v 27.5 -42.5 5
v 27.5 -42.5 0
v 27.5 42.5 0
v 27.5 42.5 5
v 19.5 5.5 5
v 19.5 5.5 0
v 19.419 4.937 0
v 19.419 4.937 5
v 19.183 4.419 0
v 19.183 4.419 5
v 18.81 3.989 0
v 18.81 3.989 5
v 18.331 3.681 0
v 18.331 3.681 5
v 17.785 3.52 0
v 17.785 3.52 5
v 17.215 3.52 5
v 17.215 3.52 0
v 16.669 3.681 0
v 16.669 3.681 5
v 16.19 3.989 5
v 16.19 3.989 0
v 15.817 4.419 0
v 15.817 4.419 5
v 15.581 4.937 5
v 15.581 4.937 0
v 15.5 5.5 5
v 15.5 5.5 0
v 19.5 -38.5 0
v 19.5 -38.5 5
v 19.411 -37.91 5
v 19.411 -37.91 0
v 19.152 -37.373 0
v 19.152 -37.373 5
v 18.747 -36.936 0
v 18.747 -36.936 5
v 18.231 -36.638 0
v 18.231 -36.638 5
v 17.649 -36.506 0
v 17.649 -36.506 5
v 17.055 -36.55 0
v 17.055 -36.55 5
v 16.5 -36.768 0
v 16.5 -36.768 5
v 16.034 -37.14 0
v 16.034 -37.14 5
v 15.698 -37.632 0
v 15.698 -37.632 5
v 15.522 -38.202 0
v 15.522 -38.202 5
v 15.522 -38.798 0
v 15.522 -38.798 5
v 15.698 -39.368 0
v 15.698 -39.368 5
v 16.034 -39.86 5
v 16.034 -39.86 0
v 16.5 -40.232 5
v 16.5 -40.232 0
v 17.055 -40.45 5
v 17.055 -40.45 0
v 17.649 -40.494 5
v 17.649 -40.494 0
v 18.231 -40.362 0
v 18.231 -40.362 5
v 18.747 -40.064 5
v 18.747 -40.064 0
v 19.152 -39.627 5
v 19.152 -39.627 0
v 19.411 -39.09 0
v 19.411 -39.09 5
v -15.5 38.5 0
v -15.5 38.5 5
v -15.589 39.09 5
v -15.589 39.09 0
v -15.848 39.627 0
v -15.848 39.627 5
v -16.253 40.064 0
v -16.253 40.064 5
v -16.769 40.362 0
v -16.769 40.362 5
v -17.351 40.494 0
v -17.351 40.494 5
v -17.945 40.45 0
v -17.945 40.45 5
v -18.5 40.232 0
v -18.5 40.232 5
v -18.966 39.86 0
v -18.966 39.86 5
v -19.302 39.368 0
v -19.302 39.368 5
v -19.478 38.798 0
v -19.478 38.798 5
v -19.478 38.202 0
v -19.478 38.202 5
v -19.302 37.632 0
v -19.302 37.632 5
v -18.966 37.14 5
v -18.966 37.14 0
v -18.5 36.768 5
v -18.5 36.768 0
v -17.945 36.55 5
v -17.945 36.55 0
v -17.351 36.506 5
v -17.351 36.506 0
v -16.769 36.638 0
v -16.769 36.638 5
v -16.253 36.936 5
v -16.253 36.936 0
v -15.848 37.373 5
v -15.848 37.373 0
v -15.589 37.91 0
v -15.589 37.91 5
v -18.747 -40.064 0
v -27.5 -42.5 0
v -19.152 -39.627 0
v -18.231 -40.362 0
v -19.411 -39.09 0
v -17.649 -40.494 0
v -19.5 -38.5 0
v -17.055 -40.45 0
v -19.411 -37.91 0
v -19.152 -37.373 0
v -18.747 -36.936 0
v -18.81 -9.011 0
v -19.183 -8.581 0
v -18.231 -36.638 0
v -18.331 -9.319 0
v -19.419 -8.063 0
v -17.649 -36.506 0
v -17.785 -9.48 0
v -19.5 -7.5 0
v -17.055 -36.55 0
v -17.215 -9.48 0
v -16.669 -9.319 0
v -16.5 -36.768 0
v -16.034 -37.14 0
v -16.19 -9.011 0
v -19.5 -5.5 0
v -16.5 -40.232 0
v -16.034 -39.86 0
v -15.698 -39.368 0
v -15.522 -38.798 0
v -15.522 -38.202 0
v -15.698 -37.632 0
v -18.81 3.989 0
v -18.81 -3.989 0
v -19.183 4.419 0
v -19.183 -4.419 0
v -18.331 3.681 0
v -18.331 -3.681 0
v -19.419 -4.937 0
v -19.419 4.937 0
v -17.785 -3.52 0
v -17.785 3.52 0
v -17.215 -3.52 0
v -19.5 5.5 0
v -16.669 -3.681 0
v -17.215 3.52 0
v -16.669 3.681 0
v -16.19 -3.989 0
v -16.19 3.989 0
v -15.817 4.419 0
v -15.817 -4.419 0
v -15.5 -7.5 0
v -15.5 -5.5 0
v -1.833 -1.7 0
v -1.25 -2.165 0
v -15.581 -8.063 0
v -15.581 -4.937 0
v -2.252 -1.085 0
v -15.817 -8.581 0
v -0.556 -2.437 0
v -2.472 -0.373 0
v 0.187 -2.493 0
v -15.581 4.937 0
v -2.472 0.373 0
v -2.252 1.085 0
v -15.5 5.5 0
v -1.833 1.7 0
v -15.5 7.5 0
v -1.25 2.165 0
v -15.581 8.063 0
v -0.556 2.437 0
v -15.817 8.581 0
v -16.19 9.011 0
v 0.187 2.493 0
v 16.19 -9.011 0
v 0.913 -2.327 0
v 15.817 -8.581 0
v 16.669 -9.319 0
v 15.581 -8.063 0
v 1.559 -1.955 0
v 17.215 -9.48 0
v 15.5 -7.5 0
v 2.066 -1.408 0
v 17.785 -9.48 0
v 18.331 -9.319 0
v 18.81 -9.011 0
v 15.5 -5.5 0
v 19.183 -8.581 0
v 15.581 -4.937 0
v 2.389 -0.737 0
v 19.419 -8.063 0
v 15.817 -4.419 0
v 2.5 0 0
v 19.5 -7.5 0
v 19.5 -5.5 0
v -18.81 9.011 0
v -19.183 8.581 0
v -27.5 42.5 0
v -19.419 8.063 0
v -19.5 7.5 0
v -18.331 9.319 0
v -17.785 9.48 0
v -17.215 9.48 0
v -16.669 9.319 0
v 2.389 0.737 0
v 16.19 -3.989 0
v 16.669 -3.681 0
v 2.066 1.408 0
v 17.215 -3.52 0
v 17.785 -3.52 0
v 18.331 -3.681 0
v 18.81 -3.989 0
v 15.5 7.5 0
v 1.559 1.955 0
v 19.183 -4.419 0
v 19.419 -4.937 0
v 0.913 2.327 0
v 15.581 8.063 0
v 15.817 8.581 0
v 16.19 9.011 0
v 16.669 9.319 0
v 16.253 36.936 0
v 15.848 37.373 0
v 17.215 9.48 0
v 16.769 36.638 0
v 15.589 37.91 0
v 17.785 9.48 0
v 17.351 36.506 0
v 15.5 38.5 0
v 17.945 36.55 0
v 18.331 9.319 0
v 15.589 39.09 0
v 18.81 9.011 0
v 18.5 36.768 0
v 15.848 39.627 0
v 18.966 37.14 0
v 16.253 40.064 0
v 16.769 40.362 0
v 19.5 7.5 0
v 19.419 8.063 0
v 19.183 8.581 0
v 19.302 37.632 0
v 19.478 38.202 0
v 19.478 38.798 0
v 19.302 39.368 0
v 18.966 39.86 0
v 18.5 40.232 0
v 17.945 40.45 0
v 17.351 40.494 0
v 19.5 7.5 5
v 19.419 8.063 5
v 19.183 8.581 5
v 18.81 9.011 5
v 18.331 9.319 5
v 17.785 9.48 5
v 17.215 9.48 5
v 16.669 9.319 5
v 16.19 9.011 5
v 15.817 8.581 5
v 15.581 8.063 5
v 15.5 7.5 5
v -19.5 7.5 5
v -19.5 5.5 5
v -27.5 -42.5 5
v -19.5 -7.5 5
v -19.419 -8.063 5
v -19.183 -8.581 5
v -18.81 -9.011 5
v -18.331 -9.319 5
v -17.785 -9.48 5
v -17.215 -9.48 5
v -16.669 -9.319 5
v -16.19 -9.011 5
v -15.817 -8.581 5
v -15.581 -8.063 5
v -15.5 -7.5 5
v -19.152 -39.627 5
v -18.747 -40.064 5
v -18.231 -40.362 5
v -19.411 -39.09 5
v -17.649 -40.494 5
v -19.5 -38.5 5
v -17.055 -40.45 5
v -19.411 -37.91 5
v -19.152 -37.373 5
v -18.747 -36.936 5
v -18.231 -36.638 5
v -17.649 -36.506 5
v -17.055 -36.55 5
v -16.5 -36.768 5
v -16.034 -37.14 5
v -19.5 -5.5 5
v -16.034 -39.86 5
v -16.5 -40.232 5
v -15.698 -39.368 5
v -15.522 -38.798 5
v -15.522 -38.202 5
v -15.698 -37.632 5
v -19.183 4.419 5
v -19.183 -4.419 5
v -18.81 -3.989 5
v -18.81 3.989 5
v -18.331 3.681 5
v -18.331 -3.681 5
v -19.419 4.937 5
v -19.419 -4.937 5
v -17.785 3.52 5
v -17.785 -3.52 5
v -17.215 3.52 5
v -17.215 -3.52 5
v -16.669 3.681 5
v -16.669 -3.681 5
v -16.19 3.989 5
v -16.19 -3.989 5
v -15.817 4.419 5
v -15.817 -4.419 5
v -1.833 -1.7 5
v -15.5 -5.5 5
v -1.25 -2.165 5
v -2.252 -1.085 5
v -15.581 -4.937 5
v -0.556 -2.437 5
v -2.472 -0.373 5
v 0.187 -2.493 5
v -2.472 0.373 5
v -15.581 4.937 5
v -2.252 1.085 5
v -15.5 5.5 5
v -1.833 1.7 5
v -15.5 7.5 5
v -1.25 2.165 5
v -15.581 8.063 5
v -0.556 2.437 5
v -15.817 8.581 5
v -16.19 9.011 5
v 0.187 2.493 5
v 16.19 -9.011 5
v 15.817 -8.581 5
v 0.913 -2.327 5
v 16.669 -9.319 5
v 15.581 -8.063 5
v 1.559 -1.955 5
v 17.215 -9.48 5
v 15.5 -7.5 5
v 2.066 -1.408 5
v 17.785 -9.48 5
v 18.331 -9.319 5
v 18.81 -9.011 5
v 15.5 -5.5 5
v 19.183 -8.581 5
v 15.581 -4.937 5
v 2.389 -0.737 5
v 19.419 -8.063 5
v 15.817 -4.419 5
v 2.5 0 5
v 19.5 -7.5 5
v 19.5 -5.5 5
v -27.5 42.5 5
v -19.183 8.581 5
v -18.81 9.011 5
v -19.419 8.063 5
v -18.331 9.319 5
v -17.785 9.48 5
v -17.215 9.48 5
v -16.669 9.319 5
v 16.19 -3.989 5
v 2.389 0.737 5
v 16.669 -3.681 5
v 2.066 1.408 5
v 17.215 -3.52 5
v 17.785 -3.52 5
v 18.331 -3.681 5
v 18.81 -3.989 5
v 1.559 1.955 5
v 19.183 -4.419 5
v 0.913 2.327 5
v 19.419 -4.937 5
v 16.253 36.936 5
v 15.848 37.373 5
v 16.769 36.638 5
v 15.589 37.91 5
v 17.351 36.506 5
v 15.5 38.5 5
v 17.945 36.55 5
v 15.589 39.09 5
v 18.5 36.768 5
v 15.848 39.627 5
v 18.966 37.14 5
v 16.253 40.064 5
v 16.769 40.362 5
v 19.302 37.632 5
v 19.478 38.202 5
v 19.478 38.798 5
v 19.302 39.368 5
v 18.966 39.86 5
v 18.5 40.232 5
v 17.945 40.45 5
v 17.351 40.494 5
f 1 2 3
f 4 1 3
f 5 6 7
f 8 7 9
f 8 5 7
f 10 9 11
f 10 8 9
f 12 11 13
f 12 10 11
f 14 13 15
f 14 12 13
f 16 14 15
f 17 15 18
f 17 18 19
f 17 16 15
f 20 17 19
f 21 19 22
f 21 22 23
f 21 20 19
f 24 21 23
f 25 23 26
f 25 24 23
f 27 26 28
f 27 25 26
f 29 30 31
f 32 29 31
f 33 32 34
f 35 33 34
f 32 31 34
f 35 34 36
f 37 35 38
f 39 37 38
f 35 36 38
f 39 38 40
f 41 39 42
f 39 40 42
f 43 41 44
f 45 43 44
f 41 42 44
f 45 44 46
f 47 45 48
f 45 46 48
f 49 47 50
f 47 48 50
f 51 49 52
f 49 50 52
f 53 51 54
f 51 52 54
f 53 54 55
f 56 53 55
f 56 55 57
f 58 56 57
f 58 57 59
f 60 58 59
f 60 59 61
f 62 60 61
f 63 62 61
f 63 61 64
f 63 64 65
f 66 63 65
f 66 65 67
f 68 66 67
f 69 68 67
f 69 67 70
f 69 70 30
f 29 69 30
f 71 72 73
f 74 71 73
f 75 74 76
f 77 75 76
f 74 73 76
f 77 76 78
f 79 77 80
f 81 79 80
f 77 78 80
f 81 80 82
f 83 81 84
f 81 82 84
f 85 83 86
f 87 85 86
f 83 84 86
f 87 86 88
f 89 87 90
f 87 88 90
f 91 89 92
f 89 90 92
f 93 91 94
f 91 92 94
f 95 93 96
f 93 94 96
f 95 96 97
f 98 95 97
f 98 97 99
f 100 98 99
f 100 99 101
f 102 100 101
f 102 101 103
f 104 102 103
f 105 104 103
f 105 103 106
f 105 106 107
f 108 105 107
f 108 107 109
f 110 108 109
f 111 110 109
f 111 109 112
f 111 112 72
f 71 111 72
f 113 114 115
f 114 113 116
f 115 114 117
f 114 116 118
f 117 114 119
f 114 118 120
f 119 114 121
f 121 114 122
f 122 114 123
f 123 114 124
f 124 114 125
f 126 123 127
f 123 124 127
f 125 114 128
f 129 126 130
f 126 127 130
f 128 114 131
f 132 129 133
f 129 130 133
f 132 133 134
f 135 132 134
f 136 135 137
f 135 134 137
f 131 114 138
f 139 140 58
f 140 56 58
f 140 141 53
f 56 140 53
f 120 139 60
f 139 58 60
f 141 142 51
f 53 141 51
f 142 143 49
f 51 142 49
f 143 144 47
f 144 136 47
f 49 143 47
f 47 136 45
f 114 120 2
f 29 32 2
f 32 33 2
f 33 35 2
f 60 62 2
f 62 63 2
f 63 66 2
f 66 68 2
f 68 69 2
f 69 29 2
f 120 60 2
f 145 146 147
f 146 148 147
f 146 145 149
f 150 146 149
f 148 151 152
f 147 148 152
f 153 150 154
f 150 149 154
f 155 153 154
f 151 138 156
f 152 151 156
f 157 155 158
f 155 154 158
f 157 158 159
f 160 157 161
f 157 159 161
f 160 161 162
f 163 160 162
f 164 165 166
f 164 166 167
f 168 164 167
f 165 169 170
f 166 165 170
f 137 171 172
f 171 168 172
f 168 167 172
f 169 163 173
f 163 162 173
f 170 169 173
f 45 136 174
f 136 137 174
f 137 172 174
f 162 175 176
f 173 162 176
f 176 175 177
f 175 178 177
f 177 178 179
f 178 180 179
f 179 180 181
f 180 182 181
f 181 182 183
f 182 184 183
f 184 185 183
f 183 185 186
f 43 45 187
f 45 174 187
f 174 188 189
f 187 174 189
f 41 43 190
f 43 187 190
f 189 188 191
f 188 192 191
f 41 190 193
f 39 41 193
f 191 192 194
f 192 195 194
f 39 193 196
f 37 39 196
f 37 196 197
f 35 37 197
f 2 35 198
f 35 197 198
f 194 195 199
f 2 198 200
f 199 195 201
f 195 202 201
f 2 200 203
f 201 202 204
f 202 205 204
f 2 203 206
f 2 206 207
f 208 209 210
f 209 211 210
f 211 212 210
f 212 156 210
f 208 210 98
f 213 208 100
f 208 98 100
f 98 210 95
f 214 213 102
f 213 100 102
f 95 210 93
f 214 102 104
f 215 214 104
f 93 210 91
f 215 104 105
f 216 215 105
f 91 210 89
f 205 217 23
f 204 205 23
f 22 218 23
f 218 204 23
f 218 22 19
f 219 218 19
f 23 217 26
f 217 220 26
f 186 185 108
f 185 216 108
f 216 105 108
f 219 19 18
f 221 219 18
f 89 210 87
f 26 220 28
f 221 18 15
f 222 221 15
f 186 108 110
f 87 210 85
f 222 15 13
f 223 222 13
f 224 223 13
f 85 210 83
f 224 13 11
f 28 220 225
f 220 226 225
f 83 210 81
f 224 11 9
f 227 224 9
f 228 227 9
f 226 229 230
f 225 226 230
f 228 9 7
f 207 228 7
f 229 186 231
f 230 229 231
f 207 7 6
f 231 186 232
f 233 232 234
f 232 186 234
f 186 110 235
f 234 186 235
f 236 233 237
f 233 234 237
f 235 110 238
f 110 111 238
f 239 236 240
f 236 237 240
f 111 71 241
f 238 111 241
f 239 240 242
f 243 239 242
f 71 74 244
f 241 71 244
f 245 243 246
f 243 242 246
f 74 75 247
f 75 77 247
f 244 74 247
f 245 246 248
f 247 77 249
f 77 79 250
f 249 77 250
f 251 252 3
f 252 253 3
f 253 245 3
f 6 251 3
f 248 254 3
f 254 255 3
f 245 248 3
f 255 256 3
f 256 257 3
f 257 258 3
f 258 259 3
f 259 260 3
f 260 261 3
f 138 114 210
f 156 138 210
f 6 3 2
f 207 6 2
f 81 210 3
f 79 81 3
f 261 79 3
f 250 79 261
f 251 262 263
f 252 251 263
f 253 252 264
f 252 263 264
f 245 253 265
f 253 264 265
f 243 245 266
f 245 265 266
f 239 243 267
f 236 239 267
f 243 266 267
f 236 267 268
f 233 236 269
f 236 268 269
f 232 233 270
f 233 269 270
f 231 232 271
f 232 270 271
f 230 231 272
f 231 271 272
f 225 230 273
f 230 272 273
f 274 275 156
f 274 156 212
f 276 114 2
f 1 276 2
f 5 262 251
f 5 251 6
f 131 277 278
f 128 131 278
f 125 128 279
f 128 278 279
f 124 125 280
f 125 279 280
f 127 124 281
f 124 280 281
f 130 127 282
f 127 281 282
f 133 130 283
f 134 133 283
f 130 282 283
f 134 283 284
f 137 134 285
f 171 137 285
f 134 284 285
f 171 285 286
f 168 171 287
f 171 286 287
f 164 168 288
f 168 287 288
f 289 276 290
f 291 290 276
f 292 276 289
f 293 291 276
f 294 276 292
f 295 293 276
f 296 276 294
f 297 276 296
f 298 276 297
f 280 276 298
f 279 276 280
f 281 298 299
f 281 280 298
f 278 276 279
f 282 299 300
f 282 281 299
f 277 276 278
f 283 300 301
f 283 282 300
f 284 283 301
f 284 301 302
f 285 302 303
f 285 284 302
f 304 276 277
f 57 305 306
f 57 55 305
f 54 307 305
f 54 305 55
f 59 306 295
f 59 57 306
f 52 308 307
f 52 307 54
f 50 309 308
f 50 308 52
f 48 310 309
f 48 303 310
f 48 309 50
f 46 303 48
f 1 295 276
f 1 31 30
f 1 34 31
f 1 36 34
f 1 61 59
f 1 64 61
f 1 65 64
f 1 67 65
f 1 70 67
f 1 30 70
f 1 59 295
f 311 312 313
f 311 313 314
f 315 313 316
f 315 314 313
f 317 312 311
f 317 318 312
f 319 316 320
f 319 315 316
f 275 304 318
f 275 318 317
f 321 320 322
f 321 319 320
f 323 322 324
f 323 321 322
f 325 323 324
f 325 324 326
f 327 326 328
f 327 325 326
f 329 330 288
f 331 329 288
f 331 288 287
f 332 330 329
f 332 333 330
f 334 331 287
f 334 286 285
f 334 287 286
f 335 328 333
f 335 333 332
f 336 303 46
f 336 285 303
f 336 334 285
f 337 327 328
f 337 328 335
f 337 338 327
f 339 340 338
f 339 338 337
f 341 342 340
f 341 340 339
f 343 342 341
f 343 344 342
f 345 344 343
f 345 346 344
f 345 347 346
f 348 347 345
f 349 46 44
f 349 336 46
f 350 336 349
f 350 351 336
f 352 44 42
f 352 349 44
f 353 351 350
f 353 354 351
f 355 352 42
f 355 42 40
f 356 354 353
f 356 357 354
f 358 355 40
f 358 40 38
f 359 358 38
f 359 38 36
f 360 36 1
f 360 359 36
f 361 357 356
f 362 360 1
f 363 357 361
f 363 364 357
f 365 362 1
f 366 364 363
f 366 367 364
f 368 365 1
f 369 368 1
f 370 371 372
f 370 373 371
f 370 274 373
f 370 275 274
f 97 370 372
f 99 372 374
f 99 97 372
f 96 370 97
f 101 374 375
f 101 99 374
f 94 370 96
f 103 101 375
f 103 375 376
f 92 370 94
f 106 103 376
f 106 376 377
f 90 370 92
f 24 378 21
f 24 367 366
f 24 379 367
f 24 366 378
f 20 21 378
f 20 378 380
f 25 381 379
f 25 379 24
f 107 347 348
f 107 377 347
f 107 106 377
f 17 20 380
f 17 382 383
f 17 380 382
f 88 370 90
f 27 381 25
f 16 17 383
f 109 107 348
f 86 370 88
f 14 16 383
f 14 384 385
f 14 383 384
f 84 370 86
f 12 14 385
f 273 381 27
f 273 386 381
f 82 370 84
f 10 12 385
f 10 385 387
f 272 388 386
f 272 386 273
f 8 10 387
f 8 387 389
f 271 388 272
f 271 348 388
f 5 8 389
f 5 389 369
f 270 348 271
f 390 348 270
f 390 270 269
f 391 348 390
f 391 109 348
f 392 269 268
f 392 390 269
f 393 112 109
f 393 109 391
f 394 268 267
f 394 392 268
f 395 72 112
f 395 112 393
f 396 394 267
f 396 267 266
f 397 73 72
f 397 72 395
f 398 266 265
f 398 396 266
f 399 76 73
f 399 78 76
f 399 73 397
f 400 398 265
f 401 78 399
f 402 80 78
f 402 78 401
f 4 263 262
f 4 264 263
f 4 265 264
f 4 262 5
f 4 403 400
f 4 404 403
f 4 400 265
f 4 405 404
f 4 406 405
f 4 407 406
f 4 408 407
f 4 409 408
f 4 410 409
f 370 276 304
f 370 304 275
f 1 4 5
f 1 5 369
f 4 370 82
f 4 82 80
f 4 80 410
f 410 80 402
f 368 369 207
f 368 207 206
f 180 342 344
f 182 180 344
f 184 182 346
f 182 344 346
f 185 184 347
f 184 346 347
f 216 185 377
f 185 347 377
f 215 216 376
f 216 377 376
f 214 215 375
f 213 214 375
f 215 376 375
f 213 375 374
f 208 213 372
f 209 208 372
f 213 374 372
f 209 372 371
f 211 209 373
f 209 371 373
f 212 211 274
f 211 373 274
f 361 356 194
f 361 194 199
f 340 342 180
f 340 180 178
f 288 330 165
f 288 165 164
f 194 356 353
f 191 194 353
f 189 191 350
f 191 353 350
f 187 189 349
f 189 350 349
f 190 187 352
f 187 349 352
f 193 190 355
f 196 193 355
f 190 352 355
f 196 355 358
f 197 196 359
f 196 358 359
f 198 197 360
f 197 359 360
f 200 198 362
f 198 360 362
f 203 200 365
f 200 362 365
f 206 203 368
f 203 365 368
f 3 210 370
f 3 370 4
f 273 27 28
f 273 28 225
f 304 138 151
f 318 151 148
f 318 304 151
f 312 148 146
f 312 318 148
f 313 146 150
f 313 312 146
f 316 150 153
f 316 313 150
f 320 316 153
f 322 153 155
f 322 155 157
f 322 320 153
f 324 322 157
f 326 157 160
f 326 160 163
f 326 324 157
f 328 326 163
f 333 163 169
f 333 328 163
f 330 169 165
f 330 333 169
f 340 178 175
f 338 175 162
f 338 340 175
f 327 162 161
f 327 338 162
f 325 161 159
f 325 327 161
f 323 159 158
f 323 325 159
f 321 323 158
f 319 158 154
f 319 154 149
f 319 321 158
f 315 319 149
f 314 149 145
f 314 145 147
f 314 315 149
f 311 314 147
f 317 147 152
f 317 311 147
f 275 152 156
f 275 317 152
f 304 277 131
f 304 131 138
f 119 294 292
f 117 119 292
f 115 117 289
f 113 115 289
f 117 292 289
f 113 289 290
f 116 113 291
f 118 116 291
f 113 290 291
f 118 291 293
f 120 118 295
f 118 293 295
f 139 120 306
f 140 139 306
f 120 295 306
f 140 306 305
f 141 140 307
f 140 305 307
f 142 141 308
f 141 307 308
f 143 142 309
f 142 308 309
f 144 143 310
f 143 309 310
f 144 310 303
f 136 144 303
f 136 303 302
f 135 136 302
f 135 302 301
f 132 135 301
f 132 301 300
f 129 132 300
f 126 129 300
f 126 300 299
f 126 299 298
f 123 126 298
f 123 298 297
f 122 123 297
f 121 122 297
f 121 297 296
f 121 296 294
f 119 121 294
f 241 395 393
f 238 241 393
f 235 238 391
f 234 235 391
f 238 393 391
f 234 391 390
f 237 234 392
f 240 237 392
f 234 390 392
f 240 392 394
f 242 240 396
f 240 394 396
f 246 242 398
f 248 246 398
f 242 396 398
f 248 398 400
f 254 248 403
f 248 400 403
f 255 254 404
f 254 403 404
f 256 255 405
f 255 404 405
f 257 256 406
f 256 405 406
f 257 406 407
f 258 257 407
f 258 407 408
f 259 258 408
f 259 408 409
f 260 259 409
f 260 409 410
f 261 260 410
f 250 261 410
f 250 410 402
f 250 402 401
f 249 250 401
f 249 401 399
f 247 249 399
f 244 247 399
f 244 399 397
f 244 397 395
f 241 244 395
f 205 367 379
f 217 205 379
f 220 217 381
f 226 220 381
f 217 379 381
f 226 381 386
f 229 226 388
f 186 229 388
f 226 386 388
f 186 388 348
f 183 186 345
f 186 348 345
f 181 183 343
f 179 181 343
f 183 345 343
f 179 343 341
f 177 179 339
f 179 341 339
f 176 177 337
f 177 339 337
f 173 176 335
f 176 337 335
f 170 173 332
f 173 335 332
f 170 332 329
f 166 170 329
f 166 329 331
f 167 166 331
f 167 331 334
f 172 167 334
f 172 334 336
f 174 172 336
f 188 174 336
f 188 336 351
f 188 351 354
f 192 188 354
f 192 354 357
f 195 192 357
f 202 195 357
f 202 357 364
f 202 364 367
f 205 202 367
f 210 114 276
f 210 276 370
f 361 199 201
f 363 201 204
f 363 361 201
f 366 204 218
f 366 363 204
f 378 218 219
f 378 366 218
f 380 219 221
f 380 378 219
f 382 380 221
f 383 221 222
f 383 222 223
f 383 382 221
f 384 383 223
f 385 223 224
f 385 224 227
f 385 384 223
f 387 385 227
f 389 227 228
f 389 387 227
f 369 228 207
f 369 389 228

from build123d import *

# Parameters (mm, degrees)
ESQUISSE1_W        = 55
ESQUISSE1_H        = 85
BOSS_EXTRU_1_DEPTH = 5
SKETCH1_R          = 2
CUT_EXTRUDE1_DEPTH = 10
CUT_EXTRUDE2_START = -10
CUT_EXTRUDE2_DEPTH = 10
SKETCH3_R          = 2.5
CUT_EXTRUDE3_DEPTH = 10


with BuildPart() as part:
    # Esquisse1 → Boss.-Extru.1 (new body)
    with BuildSketch(Plane.XY):
        Rectangle(ESQUISSE1_W, ESQUISSE1_H)
    extrude(amount=BOSS_EXTRU_1_DEPTH)

    # Sketch1 → Cut-Extrude1 (cut)
    with BuildSketch(Plane.XY.offset(5)):
        with Locations((-17.5, 38.5)):
            Circle(SKETCH1_R)
        with Locations((-17.5, 7.5)):
            Circle(SKETCH1_R)
        with Locations(Location((17.5, 7.5, 0), (0, 0, 180))):
            Circle(SKETCH1_R)
        with Locations(Location((17.5, 38.5, 0), (0, 0, 180))):
            Circle(SKETCH1_R)
        with Locations((17.5, -38.5)):
            Circle(SKETCH1_R)
        with Locations((17.5, -7.5)):
            Circle(SKETCH1_R)
        with Locations(Location((-17.5, -7.5, 0), (0, 0, 180))):
            Circle(SKETCH1_R)
        with Locations(Location((-17.5, -38.5, 0), (0, 0, 180))):
            Circle(SKETCH1_R)
    extrude(amount=-CUT_EXTRUDE1_DEPTH, mode=Mode.SUBTRACT)

    # Sketch2 → Cut-Extrude2 (cut)
    with BuildSketch(Plane(origin=(0, 0, 0), x_dir=(-1, 0, 0), z_dir=(0, 0, -1)).offset(CUT_EXTRUDE2_START)):
        with BuildLine():
            Line((-19.5, 7.5), (-19.5, 5.5))
            ThreePointArc((-19.5, 5.5), (-17.5, 3.5), (-15.5, 5.5))
            Line((-15.5, 5.5), (-15.5, 7.5))
            ThreePointArc((-15.5, 7.5), (-17.5, 9.5), (-19.5, 7.5))
        make_face()
        with BuildLine():
            Line((15.5, 7.5), (15.5, 5.5))
            ThreePointArc((15.5, 5.5), (17.5, 3.5), (19.5, 5.5))
            Line((19.5, 5.5), (19.5, 7.5))
            ThreePointArc((19.5, 7.5), (17.5, 9.5), (15.5, 7.5))
        make_face()
        with BuildLine():
            Line((19.5, -7.5), (19.5, -5.5))
            ThreePointArc((19.5, -5.5), (17.5, -3.5), (15.5, -5.5))
            Line((15.5, -5.5), (15.5, -7.5))
            ThreePointArc((15.5, -7.5), (17.5, -9.5), (19.5, -7.5))
        make_face()
        with BuildLine():
            Line((-15.5, -7.5), (-15.5, -5.5))
            ThreePointArc((-15.5, -5.5), (-17.5, -3.5), (-19.5, -5.5))
            Line((-19.5, -5.5), (-19.5, -7.5))
            ThreePointArc((-19.5, -7.5), (-17.5, -9.5), (-15.5, -7.5))
        make_face()
    extrude(amount=CUT_EXTRUDE2_DEPTH, mode=Mode.SUBTRACT)

    # Sketch3 → Cut-Extrude3 (cut)
    with BuildSketch(Plane.XY.offset(5)):
        Circle(SKETCH3_R)
    extrude(amount=-CUT_EXTRUDE3_DEPTH, mode=Mode.SUBTRACT)


solid = part.part
